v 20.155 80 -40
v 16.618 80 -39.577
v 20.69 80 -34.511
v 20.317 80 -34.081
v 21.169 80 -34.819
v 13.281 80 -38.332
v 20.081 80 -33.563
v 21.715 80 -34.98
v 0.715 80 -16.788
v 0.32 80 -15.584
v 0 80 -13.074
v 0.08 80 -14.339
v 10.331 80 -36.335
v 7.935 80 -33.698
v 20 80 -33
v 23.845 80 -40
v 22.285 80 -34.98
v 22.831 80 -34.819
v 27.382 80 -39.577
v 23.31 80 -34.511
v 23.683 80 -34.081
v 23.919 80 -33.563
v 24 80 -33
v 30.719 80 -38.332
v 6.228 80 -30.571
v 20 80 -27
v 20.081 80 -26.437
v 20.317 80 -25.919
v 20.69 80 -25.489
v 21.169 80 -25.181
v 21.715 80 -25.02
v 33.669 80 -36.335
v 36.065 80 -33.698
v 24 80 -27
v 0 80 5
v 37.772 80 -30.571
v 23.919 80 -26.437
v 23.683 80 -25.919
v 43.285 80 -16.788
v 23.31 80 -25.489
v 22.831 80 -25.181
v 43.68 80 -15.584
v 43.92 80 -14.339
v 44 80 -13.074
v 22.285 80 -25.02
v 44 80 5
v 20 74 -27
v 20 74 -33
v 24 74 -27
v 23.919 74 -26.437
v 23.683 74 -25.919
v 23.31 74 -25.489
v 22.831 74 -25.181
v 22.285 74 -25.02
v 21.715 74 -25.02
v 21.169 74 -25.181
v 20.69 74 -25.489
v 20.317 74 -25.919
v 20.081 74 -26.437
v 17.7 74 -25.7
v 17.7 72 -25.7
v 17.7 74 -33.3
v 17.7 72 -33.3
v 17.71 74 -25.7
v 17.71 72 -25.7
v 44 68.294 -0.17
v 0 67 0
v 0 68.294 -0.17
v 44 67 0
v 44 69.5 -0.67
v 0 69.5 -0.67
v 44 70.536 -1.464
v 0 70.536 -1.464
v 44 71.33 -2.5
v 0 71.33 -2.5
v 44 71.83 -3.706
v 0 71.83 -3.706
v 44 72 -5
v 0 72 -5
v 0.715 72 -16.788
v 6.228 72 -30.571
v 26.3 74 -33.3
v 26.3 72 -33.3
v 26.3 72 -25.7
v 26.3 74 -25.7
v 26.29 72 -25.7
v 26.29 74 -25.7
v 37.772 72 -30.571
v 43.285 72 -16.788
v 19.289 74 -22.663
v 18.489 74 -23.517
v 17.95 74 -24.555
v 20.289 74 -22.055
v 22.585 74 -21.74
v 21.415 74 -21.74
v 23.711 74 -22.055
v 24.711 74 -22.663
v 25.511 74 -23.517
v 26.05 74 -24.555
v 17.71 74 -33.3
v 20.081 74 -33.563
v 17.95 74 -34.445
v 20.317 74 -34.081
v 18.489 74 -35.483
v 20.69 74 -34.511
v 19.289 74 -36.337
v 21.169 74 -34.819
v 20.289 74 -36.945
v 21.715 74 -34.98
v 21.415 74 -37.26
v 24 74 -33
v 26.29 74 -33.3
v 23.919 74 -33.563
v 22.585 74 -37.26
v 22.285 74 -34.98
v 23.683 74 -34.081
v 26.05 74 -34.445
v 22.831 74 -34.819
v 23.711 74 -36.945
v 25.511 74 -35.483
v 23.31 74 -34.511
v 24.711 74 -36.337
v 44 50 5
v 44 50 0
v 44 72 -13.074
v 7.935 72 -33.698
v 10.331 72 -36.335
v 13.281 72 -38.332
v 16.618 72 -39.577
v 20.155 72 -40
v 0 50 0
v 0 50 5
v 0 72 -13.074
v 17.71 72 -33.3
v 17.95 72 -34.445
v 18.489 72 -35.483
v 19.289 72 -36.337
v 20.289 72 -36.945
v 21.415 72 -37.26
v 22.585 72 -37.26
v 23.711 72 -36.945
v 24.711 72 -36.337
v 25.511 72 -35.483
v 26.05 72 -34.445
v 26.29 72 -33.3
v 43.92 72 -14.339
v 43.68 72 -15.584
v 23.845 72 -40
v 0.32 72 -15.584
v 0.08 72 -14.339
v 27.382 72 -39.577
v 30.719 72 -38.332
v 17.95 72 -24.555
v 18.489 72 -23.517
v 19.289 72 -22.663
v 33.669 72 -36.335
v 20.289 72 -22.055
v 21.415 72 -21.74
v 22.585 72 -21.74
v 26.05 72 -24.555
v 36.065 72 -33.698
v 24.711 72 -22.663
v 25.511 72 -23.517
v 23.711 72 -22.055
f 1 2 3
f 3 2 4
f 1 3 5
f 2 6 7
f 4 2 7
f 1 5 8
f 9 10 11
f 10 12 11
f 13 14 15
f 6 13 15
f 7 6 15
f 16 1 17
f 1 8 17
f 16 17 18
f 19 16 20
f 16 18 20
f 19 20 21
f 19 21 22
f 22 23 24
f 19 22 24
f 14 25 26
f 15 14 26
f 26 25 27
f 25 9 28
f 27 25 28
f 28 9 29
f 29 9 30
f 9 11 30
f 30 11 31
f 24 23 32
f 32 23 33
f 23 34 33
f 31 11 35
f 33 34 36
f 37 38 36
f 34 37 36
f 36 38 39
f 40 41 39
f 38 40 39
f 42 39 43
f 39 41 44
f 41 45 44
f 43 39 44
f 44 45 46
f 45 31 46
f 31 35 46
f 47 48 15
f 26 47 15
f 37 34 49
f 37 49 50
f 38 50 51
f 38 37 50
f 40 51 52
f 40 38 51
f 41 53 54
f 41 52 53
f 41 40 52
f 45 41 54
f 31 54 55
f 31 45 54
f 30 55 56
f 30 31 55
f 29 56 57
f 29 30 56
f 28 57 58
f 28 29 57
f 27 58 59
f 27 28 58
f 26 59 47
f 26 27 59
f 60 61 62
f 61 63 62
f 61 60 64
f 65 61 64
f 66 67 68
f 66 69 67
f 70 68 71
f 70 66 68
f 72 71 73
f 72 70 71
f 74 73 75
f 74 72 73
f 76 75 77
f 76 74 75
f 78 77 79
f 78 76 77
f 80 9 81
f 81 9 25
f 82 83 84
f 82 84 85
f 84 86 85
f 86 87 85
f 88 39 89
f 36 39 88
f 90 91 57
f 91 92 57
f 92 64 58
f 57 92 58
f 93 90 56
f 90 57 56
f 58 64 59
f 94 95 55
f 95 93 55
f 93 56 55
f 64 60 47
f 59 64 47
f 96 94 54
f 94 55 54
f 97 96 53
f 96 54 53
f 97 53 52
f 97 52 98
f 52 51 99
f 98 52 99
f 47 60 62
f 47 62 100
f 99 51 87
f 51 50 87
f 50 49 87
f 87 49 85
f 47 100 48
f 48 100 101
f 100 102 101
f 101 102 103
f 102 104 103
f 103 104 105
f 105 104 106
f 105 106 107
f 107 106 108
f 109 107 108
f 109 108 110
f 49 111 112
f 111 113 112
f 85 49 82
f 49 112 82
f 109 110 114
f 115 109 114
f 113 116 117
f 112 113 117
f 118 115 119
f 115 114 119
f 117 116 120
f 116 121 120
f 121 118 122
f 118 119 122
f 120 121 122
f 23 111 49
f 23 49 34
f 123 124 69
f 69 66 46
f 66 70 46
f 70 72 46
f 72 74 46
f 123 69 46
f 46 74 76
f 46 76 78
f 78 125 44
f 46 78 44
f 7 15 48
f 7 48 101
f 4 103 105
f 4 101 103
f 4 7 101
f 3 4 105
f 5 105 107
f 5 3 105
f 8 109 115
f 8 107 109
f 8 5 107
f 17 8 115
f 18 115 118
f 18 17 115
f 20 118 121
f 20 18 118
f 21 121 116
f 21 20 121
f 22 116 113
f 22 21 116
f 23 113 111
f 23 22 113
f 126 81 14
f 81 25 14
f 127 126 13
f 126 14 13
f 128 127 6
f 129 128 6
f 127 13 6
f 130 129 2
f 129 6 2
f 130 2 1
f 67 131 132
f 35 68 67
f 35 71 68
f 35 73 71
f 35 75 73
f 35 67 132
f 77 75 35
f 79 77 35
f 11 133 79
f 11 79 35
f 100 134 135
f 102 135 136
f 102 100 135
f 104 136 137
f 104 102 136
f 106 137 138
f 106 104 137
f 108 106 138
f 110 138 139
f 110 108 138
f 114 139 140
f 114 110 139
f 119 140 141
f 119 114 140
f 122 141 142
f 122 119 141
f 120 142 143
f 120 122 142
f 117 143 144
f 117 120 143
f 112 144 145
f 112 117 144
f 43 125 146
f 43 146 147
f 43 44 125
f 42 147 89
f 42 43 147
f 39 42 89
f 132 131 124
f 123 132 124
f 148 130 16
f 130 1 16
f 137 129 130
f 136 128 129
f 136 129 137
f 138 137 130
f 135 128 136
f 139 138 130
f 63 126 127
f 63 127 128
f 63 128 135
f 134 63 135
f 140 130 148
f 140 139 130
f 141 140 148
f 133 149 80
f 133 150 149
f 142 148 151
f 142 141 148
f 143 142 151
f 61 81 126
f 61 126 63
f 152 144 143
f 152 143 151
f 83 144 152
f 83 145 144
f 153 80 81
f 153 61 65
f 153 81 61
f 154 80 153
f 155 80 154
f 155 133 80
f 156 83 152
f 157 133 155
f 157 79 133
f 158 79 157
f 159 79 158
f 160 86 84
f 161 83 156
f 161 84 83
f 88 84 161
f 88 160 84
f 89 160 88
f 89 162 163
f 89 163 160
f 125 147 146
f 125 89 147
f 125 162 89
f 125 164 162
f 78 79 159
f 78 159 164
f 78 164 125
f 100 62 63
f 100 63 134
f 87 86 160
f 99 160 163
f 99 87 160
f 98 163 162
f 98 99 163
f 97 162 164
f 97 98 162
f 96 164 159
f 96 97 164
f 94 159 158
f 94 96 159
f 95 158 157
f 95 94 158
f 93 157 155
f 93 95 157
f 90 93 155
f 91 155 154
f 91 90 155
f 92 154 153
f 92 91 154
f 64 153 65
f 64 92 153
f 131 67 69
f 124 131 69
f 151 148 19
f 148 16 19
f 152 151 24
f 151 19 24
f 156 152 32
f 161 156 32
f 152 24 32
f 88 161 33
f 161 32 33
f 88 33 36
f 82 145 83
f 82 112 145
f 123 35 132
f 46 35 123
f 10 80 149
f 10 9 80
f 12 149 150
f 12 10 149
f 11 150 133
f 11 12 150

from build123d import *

# Parameters (mm, degrees)
BOX009_W                  = 8.6
BOX009_H                  = 14
BOX009_DEPTH              = 7.6
CYLINDER017_R             = 4.3
CYLINDER017_DEPTH         = 10
CYLINDER016_R             = 4.3
CYLINDER016_DEPTH         = 10
CYLINDER018_R             = 2
CYLINDER018_DEPTH         = 10
CYLINDER019_R             = 4.25
CYLINDER019_DEPTH         = 10
CYLINDER015_R             = 2
CYLINDER015_DEPTH         = 10
BOX008_W                  = 4
BOX008_H                  = 16
BOX008_DEPTH              = 6
BOX010_W                  = 15
BOX010_H                  = 8
BOX010_DEPTH              = 10
CYLINDER013_R             = 2
CYLINDER013_DEPTH         = 10
CYLINDER014_R             = 4.25
CYLINDER014_DEPTH         = 10
FUSION013_PLACEMENT_ANGLE = 180
CYLINDER010_R             = 4.25
CYLINDER010_DEPTH         = 10
CYLINDER011_R             = 2
CYLINDER011_DEPTH         = 10
CYLINDER012_R             = 4.25
CYLINDER012_DEPTH         = 10
EXTRUDE001_DEPTH          = 8
BOX007_W                  = 24
BOX007_H                  = 8
BOX007_DEPTH              = 45
BOX006_W                  = 44
BOX006_H                  = 8
BOX006_DEPTH              = 15
BOX005_W                  = 44
BOX005_H                  = 30
BOX005_DEPTH              = 5
FILLET003_R               = 5
FILLET005_R               = 15
FILLET004_R               = 10
CHAMFER004_SIZE           = 2.2
CHAMFER005_SIZE           = 2.2


with BuildPart() as cube009:
    # Box009 → Box009 (new body)
    with BuildSketch(Plane(origin=(17.7, 59, -33.3), x_dir=(1, 0, 0), z_dir=(0, 0, 1))):
        with Locations((4.3, 7)):
            Rectangle(BOX009_W, BOX009_H)
    extrude(amount=BOX009_DEPTH)


with BuildPart() as cylinder017:
    # Cylinder017 → Cylinder017 (new body)
    with BuildSketch(Plane(origin=(22, 73, -26), x_dir=(1, 0, 0), z_dir=(0, -1, 0))):
        Circle(CYLINDER017_R)
    extrude(amount=CYLINDER017_DEPTH)


with BuildPart() as corta_grande:
    # Cylinder016 → Cylinder016 (new body)
    with BuildSketch(Plane(origin=(22, 73, -33), x_dir=(1, 0, 0), z_dir=(0, -1, 0))):
        Circle(CYLINDER016_R)
    extrude(amount=CYLINDER016_DEPTH)

    # Fusion017: union Cube009, Cylinder017
    add(cube009.part)
    add(cylinder017.part)


with BuildPart() as corta_grande_1:
    # Fusion017 placement: moved
    add(corta_grande.part.moved(Location((0, 1, 0))))


with BuildPart() as cylinder018:
    # Cylinder018 → Cylinder018 (new body)
    with BuildSketch(Plane(origin=(22, 80, -33), x_dir=(1, 0, 0), z_dir=(0, -1, 0))):
        Circle(CYLINDER018_R)
    extrude(amount=CYLINDER018_DEPTH)


with BuildPart() as fusion018:
    # Cylinder019 → Cylinder019 (new body)
    with BuildSketch(Plane(origin=(22, 89, -33), x_dir=(1, 0, 0), z_dir=(0, -1, 0))):
        Circle(CYLINDER019_R)
    extrude(amount=CYLINDER019_DEPTH)

    # Fusion018: union Cylinder018
    add(cylinder018.part)


with BuildPart() as cylinder015:
    # Cylinder015 → Cylinder015 (new body)
    with BuildSketch(Plane(origin=(22, 80, -27), x_dir=(1, 0, 0), z_dir=(0, -1, 0))):
        Circle(CYLINDER015_R)
    extrude(amount=CYLINDER015_DEPTH)


with BuildPart() as corta_chico:
    # Box008 → Box008 (new body)
    with BuildSketch(Plane(origin=(20, 69, -33), x_dir=(1, 0, 0), z_dir=(0, 0, 1))):
        with Locations((2, 8)):
            Rectangle(BOX008_W, BOX008_H)
    extrude(amount=BOX008_DEPTH)

    # Fusion016: union Cylinder015
    add(cylinder015.part)

    # Fusion019: union Fusion018
    add(fusion018.part)


with BuildPart() as corta_chico_1:
    # Fusion019 placement: moved
    add(corta_chico.part.moved(Location((0, 2, 0))))


with BuildPart() as cube010:
    # Box010 → Box010 (new body)
    with BuildSketch(Plane(origin=(14, 72, -38), x_dir=(1, 0, 0), z_dir=(0, 0, 1))):
        with Locations((7.5, 4)):
            Rectangle(BOX010_W, BOX010_H)
    extrude(amount=BOX010_DEPTH)


with BuildPart() as cylinder013:
    # Cylinder013 → Cylinder013 (new body)
    with BuildSketch(Plane(origin=(22, 80, -33), x_dir=(1, 0, 0), z_dir=(0, -1, 0))):
        Circle(CYLINDER013_R)
    extrude(amount=CYLINDER013_DEPTH)


with BuildPart() as fusion013:
    # Cylinder014 → Cylinder014 (new body)
    with BuildSketch(Plane(origin=(22, 89, -33), x_dir=(1, 0, 0), z_dir=(0, -1, 0))):
        Circle(CYLINDER014_R)
    extrude(amount=CYLINDER014_DEPTH)

    # Fusion013: union Cylinder013
    add(cylinder013.part)


with BuildPart() as fusion013_1:
    # Fusion013 placement: moved
    add(fusion013.part.moved(Location((0, 152, -66))).rotate(Axis((0, 152, -66), (1, 0, 0)), FUSION013_PLACEMENT_ANGLE))


with BuildPart() as cylinder010:
    # Cylinder010 → Cylinder010 (new body)
    with BuildSketch(Plane(origin=(22, 80, -33), x_dir=(1, 0, 0), z_dir=(0, -1, 0))):
        Circle(CYLINDER010_R)
    extrude(amount=CYLINDER010_DEPTH)


with BuildPart() as cylinder011:
    # Cylinder011 → Cylinder011 (new body)
    with BuildSketch(Plane(origin=(22, 80, -33), x_dir=(1, 0, 0), z_dir=(0, -1, 0))):
        Circle(CYLINDER011_R)
    extrude(amount=CYLINDER011_DEPTH)


with BuildPart() as fusion010:
    # Cylinder012 → Cylinder012 (new body)
    with BuildSketch(Plane(origin=(22, 89, -33), x_dir=(1, 0, 0), z_dir=(0, -1, 0))):
        Circle(CYLINDER012_R)
    extrude(amount=CYLINDER012_DEPTH)

    # Fusion010: union Cylinder011
    add(cylinder011.part)


with BuildPart() as extrude001:
    # Sketch001 (on Face11 of Fusion012) → Extrude001 (new body)
    with BuildSketch(Plane(origin=(0, 80, 0), x_dir=(-1, 0, 0), z_dir=(0, 1, 0))):
        Polygon((-44, -15), (-34, -40), (-34, -15), align=None)
        Polygon((-10, -15), (0, -15), (-10, -40), align=None)
    extrude(amount=-EXTRUDE001_DEPTH)


with BuildPart() as cube007:
    # Box007 → Box007 (new body)
    with BuildSketch(Plane(origin=(10, 72, -40), x_dir=(1, 0, 0), z_dir=(0, 0, 1))):
        with Locations((12, 4)):
            Rectangle(BOX007_W, BOX007_H)
    extrude(amount=BOX007_DEPTH)


with BuildPart() as cube006:
    # Box006 → Box006 (new body)
    with BuildSketch(Plane(origin=(0, 72, -15), x_dir=(1, 0, 0), z_dir=(0, 0, 1))):
        with Locations((22, 4)):
            Rectangle(BOX006_W, BOX006_H)
    extrude(amount=BOX006_DEPTH)


with BuildPart() as cut007:
    # Box005 → Box005 (new body)
    with BuildSketch(Plane(origin=(0, 50, 0), x_dir=(1, 0, 0), z_dir=(0, 0, 1))):
        with Locations((22, 15)):
            Rectangle(BOX005_W, BOX005_H)
    extrude(amount=BOX005_DEPTH)

    # Fusion014: union Cube006
    add(cube006.part)

    # Fillet003
    fillet003_edges = [cut007.edges().sort_by_distance(p)[0] for p in [
        (22, 72, 0),
    ]]
    fillet(fillet003_edges, radius=FILLET003_R)

    # Fusion012: union Cube007
    add(cube007.part)

    # Fusion015: union Extrude001
    add(extrude001.part)

    # Fillet005
    fillet005_edges = [cut007.edges().sort_by_distance(p)[0] for p in [
        (10, 76, -40),
        (34, 76, -40),
    ]]
    fillet(fillet005_edges, radius=FILLET005_R)

    # Fillet004
    fillet004_edges = [cut007.edges().sort_by_distance(p)[0] for p in [
        (44, 76, -15),
        (0, 76, -15),
    ]]
    fillet(fillet004_edges, radius=FILLET004_R)

    # Cut004: cut Fusion010
    add(fusion010.part, mode=Mode.SUBTRACT)

    # Chamfer004
    chamfer004_edges = [cut007.edges().sort_by_distance(p)[0] for p in [
        (20, 79, -33),
    ]]
    chamfer(chamfer004_edges, length=CHAMFER004_SIZE)

    # Fusion011: union Cylinder010
    add(cylinder010.part)

    # Cut005: cut Fusion013
    add(fusion013_1.part, mode=Mode.SUBTRACT)

    # Chamfer005
    chamfer005_edges = [cut007.edges().sort_by_distance(p)[0] for p in [
        (20, 73, -33),
    ]]
    chamfer(chamfer005_edges, length=CHAMFER005_SIZE)

    # Fusion020: union Cube010
    add(cube010.part)

    # Cut006: cut corta_chico
    add(corta_chico_1.part, mode=Mode.SUBTRACT)

    # Cut007: cut corta_grande
    add(corta_grande_1.part, mode=Mode.SUBTRACT)


solid = cut007.part
